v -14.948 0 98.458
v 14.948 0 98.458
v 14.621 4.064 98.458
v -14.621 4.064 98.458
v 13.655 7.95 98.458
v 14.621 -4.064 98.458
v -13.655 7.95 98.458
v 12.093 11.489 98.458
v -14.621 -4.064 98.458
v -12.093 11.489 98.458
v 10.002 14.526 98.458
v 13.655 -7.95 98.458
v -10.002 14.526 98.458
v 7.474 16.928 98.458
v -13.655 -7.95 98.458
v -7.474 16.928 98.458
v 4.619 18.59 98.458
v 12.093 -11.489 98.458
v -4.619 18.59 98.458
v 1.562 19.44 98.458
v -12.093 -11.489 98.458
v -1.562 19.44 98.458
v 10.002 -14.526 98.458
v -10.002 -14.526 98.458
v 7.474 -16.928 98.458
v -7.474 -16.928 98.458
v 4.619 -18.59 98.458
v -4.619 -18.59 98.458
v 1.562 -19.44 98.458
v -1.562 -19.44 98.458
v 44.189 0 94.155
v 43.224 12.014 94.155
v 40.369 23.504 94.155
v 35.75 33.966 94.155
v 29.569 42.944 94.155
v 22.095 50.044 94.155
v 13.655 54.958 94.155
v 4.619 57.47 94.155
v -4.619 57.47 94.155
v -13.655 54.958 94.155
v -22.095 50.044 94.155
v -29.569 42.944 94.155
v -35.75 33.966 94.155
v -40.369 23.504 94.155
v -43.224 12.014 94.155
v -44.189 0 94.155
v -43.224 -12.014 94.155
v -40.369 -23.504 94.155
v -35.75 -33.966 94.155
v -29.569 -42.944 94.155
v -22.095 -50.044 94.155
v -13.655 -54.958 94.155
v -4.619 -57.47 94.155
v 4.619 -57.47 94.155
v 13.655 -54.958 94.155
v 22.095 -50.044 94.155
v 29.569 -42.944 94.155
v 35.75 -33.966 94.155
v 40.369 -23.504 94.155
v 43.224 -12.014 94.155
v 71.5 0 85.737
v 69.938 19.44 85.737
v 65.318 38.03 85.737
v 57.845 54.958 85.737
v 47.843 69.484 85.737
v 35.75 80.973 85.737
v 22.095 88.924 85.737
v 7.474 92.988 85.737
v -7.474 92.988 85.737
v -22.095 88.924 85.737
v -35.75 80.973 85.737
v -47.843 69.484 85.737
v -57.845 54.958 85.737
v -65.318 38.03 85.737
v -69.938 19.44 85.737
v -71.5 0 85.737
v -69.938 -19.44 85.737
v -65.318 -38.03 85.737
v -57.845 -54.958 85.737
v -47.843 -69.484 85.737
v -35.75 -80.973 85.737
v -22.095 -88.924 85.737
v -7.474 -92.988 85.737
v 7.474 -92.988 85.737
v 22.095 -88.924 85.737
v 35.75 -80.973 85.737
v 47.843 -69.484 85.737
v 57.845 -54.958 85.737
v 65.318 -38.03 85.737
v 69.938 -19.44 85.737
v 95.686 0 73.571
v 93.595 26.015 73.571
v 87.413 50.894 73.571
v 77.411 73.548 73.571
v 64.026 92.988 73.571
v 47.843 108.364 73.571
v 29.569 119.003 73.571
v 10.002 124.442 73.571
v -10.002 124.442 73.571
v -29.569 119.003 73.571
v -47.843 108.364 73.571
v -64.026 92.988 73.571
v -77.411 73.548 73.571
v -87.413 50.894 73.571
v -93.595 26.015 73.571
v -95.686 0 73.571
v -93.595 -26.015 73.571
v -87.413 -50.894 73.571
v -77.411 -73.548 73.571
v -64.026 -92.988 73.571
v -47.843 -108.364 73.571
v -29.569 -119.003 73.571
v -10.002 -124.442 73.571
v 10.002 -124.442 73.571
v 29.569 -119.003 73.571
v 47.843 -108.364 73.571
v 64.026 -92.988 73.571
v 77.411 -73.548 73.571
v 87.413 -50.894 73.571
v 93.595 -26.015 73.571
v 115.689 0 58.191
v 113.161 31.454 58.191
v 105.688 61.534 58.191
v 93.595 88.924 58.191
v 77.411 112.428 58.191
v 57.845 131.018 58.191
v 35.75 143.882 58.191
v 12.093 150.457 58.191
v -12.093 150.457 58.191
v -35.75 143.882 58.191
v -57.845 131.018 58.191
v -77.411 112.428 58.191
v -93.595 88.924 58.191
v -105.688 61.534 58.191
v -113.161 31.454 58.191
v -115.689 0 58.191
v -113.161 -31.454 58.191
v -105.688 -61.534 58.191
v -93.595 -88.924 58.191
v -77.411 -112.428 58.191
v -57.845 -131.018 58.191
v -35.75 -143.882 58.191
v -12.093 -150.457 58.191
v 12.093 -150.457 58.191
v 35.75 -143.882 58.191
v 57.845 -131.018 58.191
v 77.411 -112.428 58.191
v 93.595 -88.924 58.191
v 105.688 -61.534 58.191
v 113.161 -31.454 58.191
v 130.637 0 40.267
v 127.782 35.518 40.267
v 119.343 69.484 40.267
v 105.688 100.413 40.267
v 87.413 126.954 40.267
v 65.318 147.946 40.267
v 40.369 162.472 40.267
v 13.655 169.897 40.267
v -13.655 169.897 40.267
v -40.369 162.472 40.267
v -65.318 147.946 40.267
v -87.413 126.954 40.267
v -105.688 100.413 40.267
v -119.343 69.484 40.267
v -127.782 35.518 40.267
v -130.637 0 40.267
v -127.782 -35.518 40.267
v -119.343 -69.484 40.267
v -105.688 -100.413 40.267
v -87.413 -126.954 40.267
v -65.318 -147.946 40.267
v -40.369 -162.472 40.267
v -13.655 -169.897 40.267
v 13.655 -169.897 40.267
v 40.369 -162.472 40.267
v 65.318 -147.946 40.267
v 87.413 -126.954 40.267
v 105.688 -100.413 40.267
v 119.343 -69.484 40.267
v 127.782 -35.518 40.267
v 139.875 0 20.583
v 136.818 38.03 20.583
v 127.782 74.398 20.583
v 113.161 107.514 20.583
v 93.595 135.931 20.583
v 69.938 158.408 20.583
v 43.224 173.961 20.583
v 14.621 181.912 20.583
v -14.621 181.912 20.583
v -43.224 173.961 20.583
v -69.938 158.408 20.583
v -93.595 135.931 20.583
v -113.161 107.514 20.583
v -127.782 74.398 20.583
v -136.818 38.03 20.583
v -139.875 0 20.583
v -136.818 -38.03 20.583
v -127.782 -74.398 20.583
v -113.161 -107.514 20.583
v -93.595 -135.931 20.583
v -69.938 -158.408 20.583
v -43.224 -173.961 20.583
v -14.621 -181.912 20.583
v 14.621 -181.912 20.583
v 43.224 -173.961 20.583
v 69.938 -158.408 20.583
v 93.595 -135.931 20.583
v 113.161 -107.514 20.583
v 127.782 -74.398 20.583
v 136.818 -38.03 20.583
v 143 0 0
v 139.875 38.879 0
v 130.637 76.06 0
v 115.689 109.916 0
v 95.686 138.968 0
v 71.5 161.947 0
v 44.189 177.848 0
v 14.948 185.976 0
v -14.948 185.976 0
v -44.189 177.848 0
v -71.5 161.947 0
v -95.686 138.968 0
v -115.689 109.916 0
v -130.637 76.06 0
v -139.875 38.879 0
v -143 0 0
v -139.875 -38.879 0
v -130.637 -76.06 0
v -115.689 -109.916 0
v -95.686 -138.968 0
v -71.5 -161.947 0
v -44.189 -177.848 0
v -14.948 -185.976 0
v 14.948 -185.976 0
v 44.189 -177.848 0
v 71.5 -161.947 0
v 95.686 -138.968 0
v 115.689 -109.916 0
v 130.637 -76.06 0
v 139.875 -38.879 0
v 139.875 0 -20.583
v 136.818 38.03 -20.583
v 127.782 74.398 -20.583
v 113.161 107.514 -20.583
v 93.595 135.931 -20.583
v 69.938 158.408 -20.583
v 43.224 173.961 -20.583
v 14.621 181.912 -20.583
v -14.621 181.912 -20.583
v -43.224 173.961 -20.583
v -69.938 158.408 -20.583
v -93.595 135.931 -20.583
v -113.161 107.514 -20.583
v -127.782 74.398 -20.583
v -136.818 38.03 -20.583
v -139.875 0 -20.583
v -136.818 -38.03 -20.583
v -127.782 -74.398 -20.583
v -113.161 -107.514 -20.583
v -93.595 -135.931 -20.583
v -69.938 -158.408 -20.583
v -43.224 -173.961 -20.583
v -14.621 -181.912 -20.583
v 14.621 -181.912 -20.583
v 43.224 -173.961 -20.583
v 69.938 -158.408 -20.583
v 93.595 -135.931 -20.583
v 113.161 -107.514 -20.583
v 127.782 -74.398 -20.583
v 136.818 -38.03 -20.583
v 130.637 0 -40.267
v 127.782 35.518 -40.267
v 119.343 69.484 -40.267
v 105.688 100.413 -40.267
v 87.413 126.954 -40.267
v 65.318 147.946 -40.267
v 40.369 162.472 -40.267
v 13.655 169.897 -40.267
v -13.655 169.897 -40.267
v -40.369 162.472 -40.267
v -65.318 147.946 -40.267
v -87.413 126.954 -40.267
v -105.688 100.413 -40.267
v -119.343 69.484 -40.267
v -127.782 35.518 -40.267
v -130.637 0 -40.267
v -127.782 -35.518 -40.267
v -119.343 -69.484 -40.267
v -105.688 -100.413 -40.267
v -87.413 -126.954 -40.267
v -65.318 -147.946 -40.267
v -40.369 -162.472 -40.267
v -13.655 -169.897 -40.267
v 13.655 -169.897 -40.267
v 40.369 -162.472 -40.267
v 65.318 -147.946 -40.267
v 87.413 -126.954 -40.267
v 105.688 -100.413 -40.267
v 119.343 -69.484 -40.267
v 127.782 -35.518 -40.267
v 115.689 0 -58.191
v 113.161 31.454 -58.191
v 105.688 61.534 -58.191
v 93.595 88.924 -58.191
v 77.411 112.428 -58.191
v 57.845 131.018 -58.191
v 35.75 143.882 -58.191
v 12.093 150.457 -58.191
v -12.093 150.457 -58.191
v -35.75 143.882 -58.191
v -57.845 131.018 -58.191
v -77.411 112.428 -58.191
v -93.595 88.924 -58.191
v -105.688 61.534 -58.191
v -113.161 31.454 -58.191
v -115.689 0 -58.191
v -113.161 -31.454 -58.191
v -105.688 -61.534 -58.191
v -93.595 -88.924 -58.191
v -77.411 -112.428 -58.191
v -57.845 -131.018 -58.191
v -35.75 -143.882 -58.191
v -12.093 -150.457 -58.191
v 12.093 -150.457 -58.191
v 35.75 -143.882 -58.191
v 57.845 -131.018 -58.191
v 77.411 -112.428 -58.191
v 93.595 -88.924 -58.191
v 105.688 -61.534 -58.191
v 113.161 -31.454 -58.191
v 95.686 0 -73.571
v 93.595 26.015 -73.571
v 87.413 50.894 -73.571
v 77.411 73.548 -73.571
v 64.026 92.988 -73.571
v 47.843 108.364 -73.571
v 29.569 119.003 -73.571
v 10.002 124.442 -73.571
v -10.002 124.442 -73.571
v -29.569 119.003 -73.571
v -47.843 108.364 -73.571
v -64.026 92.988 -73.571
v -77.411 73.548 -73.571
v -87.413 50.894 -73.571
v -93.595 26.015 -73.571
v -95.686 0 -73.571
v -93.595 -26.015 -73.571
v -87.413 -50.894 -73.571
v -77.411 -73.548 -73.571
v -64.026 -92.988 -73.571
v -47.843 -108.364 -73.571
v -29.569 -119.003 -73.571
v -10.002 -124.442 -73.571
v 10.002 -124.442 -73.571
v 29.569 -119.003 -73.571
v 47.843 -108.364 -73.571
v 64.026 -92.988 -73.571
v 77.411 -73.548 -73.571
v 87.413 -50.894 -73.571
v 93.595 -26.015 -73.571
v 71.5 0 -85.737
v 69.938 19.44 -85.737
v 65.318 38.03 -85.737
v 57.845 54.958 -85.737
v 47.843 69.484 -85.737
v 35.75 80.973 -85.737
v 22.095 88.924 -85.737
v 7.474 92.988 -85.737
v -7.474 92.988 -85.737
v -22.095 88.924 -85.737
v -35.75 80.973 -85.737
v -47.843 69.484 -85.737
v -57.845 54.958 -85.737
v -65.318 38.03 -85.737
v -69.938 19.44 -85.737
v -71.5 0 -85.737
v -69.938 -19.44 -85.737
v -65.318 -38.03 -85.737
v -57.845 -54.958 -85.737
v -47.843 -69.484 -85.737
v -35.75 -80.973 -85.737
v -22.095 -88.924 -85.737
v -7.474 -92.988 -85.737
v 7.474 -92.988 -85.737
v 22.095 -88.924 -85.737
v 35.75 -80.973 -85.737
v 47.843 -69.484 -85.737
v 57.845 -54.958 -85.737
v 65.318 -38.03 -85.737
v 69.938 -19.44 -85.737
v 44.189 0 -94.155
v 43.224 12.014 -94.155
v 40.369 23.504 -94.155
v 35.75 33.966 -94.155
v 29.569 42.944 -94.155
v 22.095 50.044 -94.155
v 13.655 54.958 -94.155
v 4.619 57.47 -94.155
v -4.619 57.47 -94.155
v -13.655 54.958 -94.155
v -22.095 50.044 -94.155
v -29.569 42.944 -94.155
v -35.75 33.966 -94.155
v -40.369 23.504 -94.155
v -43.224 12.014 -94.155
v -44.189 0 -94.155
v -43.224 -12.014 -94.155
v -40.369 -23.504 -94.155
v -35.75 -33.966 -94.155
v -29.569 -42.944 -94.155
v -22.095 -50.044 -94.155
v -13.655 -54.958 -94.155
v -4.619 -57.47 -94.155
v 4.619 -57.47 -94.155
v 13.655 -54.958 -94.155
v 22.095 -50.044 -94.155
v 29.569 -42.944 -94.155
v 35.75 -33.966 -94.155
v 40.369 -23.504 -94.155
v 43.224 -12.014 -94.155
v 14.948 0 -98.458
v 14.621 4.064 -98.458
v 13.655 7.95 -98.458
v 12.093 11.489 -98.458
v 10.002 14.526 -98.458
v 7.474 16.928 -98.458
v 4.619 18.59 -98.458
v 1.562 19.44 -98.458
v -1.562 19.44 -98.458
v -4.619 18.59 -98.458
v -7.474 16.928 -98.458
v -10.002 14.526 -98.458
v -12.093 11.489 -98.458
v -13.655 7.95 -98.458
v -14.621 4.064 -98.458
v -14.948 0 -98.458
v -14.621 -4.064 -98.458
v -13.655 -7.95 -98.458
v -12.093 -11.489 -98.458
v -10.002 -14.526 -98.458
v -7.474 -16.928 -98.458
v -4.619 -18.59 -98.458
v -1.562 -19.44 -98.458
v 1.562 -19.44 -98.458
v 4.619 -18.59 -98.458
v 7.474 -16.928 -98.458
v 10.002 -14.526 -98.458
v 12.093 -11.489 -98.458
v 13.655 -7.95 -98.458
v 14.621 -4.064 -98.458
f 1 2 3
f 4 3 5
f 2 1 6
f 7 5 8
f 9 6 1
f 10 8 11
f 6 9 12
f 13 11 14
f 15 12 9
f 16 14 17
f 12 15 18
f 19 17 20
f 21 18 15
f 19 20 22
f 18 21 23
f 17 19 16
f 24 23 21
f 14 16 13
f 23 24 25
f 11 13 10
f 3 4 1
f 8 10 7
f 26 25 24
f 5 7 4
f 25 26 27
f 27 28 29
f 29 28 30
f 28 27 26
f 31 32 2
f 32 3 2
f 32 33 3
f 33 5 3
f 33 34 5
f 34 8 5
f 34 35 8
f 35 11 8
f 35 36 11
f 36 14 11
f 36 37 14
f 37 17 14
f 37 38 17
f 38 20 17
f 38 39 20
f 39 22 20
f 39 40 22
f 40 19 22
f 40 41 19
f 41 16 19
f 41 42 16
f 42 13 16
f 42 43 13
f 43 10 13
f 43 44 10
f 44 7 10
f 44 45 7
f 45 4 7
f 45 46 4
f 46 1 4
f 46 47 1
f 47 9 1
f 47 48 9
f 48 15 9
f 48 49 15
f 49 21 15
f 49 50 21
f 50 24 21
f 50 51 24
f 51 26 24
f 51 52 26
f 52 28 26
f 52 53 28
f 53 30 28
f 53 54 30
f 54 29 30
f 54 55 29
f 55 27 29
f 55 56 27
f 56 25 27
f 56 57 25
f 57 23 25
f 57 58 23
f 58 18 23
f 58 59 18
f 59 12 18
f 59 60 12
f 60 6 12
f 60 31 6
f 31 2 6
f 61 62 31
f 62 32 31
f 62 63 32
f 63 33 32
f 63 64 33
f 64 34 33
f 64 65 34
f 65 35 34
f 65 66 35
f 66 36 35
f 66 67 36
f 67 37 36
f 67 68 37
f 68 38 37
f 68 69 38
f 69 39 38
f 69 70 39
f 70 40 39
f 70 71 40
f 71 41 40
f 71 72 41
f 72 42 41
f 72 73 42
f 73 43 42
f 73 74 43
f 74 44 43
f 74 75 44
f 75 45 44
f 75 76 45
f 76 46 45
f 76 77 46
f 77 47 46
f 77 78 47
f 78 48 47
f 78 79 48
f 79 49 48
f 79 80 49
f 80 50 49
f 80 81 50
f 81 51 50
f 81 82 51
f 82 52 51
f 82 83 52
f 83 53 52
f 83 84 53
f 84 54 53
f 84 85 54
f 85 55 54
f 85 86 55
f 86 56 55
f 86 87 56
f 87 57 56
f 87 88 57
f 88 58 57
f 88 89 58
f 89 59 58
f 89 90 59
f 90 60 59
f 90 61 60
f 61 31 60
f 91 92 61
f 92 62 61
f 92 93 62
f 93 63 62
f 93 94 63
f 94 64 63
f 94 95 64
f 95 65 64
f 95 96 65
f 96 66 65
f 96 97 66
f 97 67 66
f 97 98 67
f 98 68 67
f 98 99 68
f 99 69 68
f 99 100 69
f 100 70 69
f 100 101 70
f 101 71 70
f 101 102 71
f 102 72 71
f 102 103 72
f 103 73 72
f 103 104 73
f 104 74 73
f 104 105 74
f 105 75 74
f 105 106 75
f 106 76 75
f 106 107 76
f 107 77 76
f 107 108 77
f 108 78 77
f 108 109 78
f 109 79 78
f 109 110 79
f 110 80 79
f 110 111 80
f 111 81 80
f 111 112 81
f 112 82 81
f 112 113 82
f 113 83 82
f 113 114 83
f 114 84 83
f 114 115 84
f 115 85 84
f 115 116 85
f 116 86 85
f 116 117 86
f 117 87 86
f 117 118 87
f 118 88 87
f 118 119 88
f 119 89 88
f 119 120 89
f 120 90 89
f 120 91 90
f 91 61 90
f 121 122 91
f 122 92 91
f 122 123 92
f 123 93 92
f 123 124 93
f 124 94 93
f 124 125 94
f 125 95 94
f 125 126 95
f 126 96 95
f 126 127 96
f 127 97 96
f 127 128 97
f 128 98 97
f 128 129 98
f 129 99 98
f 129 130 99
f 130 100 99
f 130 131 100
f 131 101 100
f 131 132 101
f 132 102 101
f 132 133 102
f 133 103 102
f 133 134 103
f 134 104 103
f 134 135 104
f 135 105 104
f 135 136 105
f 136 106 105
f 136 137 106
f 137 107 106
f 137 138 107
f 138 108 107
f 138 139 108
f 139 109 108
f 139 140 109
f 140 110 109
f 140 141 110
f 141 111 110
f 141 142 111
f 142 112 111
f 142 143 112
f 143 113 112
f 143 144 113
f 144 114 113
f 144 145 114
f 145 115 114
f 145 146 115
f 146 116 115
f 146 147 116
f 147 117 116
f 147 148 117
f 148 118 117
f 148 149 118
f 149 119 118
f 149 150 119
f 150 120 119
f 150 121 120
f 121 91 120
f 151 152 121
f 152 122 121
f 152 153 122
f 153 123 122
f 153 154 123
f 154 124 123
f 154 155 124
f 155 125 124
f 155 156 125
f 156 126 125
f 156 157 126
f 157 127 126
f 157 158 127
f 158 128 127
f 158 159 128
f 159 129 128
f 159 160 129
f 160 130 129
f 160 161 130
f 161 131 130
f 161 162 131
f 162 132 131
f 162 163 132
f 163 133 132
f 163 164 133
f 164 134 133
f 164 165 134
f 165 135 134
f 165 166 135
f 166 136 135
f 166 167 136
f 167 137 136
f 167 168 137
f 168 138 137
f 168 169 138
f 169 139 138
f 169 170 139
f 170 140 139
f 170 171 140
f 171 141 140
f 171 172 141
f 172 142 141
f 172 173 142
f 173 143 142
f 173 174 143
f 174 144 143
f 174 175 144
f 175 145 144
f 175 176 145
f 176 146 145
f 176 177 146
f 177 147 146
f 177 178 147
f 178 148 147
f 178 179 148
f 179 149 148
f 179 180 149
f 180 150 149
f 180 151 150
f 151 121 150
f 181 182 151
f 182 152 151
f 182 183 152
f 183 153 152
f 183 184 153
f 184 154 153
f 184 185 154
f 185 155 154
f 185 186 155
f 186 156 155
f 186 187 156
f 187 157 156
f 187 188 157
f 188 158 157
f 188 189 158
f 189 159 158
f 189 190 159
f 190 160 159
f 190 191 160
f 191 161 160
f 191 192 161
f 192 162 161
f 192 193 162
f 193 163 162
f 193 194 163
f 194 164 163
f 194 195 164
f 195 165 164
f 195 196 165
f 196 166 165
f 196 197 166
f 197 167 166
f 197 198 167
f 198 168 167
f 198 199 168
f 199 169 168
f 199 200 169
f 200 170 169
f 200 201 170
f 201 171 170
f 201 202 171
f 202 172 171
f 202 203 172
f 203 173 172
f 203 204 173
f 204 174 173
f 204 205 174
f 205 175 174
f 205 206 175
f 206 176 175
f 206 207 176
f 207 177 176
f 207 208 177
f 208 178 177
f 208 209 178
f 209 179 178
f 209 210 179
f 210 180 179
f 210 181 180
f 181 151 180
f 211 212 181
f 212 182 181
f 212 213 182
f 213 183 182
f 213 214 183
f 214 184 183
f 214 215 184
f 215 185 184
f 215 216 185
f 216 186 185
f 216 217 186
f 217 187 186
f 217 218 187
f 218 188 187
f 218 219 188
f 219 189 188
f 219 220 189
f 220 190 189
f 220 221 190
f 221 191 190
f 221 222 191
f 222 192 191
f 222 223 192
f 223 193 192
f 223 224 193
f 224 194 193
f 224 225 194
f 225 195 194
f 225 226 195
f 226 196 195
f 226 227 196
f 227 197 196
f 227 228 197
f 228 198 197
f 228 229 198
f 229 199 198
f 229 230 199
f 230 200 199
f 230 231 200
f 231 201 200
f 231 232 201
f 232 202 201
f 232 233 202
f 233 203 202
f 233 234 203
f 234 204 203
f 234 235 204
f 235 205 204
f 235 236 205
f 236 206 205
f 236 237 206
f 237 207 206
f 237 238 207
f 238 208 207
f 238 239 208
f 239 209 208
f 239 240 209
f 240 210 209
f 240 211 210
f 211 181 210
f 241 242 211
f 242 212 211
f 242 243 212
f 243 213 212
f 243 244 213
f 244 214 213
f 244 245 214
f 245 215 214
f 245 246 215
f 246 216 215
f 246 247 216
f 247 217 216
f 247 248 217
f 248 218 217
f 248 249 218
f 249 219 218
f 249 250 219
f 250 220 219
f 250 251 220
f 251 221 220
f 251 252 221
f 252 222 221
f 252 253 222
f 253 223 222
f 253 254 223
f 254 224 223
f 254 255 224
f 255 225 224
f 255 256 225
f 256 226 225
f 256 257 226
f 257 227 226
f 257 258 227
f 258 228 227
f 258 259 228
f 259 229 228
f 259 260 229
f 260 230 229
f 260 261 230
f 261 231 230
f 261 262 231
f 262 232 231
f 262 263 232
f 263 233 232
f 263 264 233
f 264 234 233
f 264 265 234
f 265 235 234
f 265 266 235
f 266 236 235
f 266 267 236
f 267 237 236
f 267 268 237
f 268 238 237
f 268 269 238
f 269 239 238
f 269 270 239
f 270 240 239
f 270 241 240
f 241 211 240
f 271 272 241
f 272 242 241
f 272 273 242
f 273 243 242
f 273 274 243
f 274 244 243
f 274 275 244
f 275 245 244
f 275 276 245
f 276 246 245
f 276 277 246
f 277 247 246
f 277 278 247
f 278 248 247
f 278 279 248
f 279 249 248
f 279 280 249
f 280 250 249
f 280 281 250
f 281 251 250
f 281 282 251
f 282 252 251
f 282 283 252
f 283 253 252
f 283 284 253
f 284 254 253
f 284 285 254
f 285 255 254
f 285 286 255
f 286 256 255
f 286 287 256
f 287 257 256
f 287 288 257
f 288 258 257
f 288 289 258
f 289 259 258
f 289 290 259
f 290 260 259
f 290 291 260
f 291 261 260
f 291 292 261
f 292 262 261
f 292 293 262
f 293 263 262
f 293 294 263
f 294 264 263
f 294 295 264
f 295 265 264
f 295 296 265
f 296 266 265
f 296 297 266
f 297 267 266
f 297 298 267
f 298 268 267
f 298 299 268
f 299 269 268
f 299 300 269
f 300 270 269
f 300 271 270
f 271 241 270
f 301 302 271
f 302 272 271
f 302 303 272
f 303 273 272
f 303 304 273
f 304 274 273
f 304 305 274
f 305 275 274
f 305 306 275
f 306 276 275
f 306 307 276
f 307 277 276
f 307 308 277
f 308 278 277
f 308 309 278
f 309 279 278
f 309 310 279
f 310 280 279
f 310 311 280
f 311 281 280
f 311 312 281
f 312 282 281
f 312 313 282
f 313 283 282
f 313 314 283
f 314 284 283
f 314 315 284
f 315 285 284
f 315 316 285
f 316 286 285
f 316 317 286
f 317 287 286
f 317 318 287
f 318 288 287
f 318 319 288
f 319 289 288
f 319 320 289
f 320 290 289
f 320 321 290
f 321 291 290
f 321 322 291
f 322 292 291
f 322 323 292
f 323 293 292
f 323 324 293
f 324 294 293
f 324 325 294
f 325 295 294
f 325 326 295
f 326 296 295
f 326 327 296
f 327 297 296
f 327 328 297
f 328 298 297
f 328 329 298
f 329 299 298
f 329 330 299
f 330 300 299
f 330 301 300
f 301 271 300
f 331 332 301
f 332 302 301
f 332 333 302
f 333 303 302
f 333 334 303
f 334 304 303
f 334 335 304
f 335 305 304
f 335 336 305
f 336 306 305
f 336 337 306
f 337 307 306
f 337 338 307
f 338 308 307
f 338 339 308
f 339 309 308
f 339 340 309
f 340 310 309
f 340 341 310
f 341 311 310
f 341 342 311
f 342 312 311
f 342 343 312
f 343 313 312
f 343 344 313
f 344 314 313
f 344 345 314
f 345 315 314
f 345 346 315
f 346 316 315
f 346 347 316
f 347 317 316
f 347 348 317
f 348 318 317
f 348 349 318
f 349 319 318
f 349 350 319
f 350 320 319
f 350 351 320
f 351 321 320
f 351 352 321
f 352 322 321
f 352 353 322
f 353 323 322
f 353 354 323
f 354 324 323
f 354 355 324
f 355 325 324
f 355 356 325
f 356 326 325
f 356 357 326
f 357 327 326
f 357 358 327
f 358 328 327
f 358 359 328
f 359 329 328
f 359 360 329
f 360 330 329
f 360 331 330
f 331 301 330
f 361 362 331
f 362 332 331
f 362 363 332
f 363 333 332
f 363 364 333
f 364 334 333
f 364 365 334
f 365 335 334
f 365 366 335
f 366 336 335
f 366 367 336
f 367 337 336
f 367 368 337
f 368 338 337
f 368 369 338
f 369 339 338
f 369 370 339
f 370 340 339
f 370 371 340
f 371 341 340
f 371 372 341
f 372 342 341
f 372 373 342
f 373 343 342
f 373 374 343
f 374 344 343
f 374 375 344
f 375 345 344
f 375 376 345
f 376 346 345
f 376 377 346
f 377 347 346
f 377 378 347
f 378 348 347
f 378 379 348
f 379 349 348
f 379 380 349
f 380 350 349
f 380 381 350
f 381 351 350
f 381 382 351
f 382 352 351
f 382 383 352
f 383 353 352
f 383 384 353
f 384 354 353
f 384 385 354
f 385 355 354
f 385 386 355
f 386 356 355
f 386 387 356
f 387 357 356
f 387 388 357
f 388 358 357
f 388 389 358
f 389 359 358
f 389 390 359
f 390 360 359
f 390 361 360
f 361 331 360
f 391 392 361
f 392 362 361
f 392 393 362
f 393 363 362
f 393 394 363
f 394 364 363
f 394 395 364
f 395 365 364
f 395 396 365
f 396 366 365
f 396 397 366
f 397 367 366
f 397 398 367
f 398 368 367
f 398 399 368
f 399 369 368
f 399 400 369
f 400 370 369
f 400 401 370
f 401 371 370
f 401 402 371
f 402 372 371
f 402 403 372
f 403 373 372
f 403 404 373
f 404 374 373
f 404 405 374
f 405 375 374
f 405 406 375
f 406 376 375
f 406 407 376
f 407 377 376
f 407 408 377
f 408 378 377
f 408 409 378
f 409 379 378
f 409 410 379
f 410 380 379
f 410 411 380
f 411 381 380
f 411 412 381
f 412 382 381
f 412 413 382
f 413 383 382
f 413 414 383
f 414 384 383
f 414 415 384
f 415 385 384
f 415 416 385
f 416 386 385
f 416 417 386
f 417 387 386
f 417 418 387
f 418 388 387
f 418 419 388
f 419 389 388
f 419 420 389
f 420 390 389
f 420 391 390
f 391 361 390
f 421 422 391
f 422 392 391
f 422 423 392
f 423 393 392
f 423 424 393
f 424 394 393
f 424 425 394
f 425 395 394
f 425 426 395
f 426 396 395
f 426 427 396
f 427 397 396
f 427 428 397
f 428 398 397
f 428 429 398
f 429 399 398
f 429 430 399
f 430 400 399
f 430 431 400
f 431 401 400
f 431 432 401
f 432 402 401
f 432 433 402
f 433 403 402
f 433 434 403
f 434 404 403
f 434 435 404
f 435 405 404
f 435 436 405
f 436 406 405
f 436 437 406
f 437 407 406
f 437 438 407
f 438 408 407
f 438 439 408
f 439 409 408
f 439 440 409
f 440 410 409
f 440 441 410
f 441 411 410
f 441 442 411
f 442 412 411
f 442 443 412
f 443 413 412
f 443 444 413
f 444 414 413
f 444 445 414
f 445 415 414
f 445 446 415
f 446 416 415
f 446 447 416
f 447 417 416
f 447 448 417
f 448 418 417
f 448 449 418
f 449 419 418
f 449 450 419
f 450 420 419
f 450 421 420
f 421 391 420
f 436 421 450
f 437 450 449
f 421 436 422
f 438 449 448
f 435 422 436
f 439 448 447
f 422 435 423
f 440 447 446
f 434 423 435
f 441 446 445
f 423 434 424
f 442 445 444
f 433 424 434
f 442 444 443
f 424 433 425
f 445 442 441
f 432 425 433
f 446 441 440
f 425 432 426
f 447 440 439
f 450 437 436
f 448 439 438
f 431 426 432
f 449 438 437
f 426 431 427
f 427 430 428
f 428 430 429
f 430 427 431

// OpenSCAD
// Generated by SolidPython 1.0.1 on 2020-07-29 00:46:51


scale(v = [13, 17, 9]) {
	sphere(r = 11);
}
/***********************************************
*********      SolidPython code:      **********
************************************************
 
# import packages: SolidPython
from solid import *
from solid.utils import *
from itertools import chain, combinations, permutations


class Resize:

    def __init__(self, scad_file):
        self.scad_file = scad_file
        #self.scad_file = import_scad(scad_file)
        # cone/cylinder param:
        self.r1 = 0
        self.r2 = 0
        self.h = 0
        # rectangular prism param:
        self.w = 0
        self.l = 0
        # ellipse param:
        self.r = 0

    # import OpenScad code (file name corresponds to shape)


    # classify shape + parameters
    def assign(self, param1, param2, param3):
        if self.scad_file == 'cone.scad':
            self.r1 = param1
            self.r2 = param2
            self.h = param3
        elif self.scad_file == 'cylinder.scad':
            self.r1 = param1
            self.r2 = param2
            self.h = param3
        elif self.scad_file == 'rectangularPrism.scad':
            self.h = param1
            self.l = param2
            self.w = param3
        else:
            self.r = param1
            self.h = param2

    # resize parameters
    def iterate(self):
        x = range(3, 20, 2)
        i = 1
        if self.scad_file == 'cone.scad':
            tempList = list(permutations(x, 2))
            for temp in tempList:
                param1 = temp[0]
                param2 = temp[1]
                filepath = 'produced_scad_files/' + 'cone' + str(param1) + '_' + str(param2) + '_' + '.scad'
                scad_render_to_file(cylinder(h=param1, r1=param2, r2=0), filepath)

        elif self.scad_file == 'cylinder.scad':
            tempList = list(permutations(x, 3))
            for temp in tempList:
                param1 = temp[0]
                param2 = temp[1]
                filepath = 'produced_scad_files/' + 'cylinder' + str(param1) + '_' + str(param2) + '_' + '.scad'
                scad_render_to_file(cylinder(h=param1, r1=param2, r2=param2), filepath)

        elif self.scad_file == 'rectangularPrism.scad':
            tempList = list(permutations(x, 3))
            for temp in tempList:
                param1 = temp[0]
                param2 = temp[1]
                param3 = temp[2]
                filepath = 'produced_scad_files/' + 'rectangularPrism' + str(param1) + '_' + str(param2) + '_' + str(
                    param3) + '.scad'
                scad_render_to_file(cube(size=(param1, param2, param3)), filepath)

        elif self.scad_file == 'ellipse.scad':
            tempList = list(permutations(x, 4))
            for temp in tempList:
                param1 = temp[0]
                param2 = temp[1]
                param3 = temp[2]
                param4 = temp[3]
                filepath = 'produced_scad_files/' + 'ellipse' + str(param1) + '_' + str(param2) + '_' + str(param3) + '_' + str(param4) + '.scad'
                scad_render_to_file(scale([param1, param2, param3])(sphere(r=param4)), filepath)

    def render_to_scadfile(self):
        scad_render_to_file(scad, 'example.scad') 
 
************************************************/
